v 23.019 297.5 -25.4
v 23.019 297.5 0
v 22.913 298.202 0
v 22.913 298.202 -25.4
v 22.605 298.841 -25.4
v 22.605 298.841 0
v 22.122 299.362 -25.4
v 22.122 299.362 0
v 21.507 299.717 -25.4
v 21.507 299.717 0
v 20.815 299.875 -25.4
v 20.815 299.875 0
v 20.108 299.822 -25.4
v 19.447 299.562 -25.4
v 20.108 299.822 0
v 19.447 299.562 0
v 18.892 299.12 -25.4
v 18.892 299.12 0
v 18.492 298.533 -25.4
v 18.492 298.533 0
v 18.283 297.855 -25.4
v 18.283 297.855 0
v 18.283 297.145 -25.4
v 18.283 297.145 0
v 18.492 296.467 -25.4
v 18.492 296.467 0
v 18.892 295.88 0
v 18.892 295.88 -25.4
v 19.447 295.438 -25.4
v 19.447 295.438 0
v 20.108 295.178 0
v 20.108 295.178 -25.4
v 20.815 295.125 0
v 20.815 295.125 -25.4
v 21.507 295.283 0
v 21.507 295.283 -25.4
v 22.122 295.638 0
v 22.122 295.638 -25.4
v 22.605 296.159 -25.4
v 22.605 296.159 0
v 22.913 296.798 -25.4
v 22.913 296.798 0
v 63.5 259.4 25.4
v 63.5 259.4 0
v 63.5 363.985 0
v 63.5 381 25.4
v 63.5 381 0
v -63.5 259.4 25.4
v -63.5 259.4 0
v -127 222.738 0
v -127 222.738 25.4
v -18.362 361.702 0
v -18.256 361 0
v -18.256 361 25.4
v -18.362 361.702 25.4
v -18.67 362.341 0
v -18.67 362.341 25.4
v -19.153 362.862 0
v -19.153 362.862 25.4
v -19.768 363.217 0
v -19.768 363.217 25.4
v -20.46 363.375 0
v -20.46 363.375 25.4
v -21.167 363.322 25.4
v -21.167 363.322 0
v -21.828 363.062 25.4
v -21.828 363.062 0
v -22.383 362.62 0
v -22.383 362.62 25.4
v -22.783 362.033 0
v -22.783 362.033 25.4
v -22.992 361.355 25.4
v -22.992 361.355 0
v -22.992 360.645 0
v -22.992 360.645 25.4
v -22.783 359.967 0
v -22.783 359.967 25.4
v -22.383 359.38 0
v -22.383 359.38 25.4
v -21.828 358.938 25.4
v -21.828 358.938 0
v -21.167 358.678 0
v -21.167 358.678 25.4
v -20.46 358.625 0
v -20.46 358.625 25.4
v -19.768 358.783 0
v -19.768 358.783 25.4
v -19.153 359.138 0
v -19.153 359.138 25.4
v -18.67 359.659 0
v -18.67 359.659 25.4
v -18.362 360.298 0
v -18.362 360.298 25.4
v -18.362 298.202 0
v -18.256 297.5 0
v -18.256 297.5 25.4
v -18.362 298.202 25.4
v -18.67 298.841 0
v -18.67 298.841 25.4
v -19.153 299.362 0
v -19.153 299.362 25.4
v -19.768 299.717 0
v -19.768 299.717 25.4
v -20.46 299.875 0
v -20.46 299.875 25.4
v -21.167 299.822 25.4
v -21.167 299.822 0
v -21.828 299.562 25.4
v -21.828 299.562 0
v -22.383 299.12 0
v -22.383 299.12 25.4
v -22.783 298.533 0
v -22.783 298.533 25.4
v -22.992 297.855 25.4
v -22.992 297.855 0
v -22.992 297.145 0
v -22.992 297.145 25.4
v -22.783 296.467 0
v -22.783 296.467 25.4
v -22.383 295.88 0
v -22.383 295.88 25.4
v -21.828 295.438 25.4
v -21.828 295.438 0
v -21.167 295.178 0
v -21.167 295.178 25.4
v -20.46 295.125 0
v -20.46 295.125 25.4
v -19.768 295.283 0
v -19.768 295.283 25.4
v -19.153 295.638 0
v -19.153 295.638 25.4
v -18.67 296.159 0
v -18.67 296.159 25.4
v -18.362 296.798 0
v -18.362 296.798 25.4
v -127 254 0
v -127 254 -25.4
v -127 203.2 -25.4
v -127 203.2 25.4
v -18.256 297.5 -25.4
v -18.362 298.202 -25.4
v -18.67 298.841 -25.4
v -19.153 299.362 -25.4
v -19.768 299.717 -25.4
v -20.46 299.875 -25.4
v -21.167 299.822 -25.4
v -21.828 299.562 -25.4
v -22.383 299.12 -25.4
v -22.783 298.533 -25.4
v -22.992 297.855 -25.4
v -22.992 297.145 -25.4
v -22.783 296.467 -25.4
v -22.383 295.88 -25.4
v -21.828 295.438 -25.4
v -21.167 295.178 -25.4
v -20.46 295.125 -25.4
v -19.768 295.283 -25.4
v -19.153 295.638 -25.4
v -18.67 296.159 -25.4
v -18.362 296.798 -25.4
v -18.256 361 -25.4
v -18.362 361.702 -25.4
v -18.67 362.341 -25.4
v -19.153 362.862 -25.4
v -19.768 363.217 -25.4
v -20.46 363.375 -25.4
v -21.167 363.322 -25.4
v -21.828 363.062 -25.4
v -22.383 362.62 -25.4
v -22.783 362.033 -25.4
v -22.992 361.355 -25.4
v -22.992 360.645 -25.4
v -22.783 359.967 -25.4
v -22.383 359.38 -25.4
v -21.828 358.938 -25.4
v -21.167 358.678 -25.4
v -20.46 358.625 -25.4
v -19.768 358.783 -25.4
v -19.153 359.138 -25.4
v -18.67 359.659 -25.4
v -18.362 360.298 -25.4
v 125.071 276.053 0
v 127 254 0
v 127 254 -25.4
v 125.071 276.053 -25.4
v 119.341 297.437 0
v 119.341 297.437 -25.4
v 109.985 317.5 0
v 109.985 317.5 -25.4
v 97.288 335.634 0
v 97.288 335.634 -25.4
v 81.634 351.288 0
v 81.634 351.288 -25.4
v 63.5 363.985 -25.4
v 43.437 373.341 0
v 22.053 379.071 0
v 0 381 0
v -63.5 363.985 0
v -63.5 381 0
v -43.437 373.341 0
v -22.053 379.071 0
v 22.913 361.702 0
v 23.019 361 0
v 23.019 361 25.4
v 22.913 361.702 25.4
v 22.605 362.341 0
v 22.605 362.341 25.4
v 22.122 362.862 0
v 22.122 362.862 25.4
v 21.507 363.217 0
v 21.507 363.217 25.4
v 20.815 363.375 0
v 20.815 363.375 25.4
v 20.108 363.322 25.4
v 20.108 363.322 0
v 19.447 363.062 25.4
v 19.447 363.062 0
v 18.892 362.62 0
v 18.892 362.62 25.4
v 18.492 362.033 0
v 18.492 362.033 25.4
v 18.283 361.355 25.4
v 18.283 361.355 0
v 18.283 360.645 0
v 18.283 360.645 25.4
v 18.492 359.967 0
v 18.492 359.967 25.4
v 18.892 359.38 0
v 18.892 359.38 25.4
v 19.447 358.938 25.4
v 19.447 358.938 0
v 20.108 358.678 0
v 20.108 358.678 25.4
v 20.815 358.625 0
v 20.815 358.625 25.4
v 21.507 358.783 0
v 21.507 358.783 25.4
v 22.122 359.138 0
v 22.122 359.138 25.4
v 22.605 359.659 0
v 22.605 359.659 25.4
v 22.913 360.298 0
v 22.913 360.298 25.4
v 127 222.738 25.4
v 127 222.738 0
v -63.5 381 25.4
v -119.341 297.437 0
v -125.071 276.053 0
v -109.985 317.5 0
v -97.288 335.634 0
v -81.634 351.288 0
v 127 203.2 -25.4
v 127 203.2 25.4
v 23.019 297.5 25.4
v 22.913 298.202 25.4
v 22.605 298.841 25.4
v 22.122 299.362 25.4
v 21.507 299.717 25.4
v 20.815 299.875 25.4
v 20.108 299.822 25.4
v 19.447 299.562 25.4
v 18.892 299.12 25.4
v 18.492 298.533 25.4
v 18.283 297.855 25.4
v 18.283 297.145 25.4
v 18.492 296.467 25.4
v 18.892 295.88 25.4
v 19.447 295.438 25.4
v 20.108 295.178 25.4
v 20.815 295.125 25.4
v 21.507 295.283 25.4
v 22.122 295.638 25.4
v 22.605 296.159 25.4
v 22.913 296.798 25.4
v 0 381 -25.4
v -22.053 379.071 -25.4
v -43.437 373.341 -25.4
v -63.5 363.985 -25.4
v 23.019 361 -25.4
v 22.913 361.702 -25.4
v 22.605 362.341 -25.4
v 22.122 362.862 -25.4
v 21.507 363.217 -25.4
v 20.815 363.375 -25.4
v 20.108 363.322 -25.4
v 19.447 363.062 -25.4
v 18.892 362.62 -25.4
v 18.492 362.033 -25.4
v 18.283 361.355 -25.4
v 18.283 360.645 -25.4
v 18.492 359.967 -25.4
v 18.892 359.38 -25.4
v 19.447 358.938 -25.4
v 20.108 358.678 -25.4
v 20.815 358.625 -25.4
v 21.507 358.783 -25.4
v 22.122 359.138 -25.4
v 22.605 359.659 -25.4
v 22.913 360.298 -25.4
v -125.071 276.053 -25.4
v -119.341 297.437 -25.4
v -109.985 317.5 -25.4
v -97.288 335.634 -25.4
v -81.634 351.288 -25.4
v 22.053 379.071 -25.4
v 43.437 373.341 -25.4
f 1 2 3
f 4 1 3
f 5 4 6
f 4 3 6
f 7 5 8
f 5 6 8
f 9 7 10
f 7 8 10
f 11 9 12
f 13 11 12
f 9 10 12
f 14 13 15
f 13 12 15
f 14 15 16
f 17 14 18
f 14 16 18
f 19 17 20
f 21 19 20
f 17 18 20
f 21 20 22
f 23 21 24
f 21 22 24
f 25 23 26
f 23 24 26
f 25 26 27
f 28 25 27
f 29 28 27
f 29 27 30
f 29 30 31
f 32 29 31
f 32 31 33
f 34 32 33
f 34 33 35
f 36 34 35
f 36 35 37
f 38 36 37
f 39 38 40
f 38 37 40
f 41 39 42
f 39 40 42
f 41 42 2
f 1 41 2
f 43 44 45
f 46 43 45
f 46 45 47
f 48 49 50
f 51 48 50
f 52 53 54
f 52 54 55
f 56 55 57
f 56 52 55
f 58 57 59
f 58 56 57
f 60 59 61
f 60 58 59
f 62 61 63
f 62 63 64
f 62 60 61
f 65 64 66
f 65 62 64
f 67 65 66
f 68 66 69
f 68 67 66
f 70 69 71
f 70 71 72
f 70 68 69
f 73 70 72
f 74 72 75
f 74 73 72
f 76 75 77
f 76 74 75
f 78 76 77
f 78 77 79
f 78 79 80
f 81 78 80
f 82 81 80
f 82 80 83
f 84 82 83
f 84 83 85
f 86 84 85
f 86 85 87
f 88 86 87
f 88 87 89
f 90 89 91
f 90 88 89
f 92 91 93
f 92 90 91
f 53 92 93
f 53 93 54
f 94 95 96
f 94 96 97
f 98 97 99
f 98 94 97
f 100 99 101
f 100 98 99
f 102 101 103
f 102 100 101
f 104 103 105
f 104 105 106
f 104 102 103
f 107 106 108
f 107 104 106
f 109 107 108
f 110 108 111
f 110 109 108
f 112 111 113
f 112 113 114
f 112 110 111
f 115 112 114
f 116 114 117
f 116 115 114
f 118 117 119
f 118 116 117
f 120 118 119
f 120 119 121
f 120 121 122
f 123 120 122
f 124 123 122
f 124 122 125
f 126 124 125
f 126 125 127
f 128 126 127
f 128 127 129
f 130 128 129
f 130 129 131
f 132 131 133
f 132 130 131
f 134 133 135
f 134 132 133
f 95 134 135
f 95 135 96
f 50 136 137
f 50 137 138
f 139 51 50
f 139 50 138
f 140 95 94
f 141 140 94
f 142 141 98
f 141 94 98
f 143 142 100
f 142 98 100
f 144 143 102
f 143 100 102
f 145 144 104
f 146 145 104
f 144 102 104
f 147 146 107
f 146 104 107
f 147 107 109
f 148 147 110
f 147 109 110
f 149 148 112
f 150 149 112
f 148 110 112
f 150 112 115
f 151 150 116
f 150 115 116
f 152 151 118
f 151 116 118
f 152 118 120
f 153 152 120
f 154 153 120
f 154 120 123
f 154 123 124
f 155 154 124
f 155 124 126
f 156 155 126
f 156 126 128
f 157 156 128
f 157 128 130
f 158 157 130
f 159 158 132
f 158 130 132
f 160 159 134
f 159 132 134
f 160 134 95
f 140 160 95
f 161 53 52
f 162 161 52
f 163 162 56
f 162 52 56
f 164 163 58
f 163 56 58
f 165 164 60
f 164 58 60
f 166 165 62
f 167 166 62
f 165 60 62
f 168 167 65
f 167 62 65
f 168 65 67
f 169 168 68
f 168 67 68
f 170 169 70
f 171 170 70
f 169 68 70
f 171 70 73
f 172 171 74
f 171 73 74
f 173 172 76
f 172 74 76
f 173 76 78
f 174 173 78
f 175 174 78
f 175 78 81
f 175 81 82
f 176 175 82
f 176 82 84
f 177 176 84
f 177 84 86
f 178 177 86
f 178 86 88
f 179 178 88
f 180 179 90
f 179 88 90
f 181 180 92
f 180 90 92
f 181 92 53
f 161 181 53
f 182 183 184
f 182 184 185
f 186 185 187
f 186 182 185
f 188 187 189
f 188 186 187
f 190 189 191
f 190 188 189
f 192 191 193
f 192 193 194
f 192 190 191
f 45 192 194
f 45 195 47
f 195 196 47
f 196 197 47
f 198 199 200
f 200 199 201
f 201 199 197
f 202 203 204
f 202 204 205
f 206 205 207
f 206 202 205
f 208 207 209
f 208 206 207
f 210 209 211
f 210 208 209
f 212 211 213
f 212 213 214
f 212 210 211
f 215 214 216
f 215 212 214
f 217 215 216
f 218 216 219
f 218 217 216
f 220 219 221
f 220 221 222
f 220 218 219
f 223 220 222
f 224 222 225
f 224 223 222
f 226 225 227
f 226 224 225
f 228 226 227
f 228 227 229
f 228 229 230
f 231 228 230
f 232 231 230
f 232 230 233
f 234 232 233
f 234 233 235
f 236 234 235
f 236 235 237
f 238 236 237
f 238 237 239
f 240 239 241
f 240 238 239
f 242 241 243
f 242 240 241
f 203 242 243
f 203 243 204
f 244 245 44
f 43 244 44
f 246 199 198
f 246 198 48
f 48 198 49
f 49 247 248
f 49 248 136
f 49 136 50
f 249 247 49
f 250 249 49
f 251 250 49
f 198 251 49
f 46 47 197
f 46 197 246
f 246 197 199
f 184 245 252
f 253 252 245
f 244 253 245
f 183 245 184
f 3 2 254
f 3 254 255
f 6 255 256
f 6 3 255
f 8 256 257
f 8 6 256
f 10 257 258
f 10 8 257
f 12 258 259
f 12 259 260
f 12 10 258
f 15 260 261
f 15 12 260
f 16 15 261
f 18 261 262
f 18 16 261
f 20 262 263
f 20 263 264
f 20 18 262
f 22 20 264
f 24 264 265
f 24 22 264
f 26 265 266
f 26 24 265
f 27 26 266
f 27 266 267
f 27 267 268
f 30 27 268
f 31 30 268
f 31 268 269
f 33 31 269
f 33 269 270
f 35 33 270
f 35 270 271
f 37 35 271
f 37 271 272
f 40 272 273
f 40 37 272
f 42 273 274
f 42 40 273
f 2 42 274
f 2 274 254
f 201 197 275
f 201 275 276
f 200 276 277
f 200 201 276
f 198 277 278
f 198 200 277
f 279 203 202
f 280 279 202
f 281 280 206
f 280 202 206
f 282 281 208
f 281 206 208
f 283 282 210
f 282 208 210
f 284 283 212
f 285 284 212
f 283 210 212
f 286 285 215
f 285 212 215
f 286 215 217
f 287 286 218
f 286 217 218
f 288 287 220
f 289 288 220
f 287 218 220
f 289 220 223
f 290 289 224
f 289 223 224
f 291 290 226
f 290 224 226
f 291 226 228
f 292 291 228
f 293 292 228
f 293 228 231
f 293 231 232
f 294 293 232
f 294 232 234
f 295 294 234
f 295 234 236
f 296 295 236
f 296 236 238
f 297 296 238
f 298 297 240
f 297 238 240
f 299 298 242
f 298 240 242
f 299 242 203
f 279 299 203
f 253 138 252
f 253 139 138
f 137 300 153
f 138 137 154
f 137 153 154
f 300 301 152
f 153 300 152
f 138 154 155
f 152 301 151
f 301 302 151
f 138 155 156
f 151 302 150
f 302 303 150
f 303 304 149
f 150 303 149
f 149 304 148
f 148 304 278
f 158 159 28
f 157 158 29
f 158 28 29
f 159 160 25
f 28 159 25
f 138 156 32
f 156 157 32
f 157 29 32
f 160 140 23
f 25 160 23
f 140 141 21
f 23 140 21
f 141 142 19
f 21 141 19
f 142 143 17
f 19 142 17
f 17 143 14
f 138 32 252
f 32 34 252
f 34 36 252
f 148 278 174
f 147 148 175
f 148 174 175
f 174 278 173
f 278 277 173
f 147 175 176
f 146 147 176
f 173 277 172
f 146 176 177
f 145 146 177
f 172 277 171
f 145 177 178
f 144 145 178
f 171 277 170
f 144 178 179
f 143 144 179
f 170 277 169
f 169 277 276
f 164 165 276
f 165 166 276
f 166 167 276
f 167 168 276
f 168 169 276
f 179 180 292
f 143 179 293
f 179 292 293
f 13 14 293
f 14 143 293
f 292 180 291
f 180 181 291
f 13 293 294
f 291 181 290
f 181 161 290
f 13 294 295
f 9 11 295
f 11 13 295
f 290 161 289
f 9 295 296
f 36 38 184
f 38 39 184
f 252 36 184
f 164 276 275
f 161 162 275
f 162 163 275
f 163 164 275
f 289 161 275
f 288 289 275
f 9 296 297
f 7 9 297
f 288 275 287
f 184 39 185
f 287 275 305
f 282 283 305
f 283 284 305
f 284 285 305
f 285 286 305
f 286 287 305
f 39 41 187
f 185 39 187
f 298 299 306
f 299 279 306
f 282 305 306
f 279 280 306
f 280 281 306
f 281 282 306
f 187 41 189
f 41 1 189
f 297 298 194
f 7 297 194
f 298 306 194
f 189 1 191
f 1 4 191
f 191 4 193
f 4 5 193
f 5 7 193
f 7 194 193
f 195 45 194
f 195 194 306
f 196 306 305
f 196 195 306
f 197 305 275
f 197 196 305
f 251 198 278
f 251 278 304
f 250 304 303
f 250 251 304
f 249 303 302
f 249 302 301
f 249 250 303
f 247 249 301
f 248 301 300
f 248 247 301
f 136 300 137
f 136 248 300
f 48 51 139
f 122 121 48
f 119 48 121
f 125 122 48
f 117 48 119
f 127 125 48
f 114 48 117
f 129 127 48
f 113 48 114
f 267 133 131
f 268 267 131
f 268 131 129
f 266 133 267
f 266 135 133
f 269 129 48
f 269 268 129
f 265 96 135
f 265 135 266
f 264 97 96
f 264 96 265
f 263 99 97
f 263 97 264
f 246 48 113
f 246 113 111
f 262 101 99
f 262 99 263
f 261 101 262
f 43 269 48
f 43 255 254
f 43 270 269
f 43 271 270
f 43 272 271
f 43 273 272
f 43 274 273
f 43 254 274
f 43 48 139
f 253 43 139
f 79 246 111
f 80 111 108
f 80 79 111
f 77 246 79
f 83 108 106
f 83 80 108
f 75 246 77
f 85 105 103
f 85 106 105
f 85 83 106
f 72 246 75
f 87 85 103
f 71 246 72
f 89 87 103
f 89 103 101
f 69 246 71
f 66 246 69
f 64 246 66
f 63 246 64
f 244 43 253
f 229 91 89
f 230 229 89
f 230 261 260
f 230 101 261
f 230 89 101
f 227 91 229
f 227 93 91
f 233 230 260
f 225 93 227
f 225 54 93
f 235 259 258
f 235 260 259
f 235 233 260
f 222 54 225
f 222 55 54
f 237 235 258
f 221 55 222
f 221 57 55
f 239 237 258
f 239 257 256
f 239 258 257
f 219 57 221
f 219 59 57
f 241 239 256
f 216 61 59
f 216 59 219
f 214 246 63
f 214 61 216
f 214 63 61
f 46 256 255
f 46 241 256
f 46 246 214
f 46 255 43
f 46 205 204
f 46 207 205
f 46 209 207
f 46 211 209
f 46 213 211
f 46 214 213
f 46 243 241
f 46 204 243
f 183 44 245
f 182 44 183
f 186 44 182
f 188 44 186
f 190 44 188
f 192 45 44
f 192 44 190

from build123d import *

# Parameters (mm, degrees)
F0_R     = 2.38125
F1_DEPTH = 25.4
F2_DEPTH = 25.4


with BuildPart() as f1:
    # F0 (on Top) → F1 (new body)
    with BuildSketch(Plane.XY):
        with BuildLine():
            ThreePointArc((0, 381), (-32.870019, 376.67258), (-63.5, 363.985226))
            Line((-63.5, 363.985226), (-63.5, 259.4))
            Line((-63.5, 259.4), (-127, 222.738258))
            Line((-127, 222.738258), (-127, 203.2))
            Line((-127, 203.2), (127, 203.2))
            Line((127, 203.2), (127, 222.738258))
            Line((127, 222.738258), (63.5, 259.4))
            Line((63.5, 259.4), (63.5, 363.985226))
            ThreePointArc((63.5, 363.985226), (32.870019, 376.67258), (0, 381))
        make_face()
        with Locations((-20.6375, 297.5)):
            Circle(F0_R, mode=Mode.SUBTRACT)
        with Locations((-20.6375, 361)):
            Circle(F0_R, mode=Mode.SUBTRACT)
        with Locations((20.6375, 297.5)):
            Circle(F0_R, mode=Mode.SUBTRACT)
        with Locations((20.6375, 361)):
            Circle(F0_R, mode=Mode.SUBTRACT)
        with BuildLine():
            Line((0, 381), (-63.5, 381))
            Line((-63.5, 381), (-63.5, 363.985226))
            ThreePointArc((-63.5, 363.985226), (-32.870019, 376.67258), (0, 381))
        make_face()
        with BuildLine():
            Line((63.5, 381), (0, 381))
            ThreePointArc((0, 381), (32.870019, 376.67258), (63.5, 363.985226))
            Line((63.5, 363.985226), (63.5, 381))
        make_face()
    extrude(amount=F1_DEPTH)

    # F0 (on Top) → F2 (join)
    with BuildSketch(Plane.XY):
        with BuildLine():
            ThreePointArc((127, 254), (109.985226, 317.5), (63.5, 363.985226))
            Line((63.5, 363.985226), (63.5, 259.4))
            Line((63.5, 259.4), (127, 222.738258))
            Line((127, 222.738258), (127, 254))
        make_face()
        with BuildLine():
            ThreePointArc((0, 381), (-32.870019, 376.67258), (-63.5, 363.985226))
            Line((-63.5, 363.985226), (-63.5, 259.4))
            Line((-63.5, 259.4), (-127, 222.738258))
            Line((-127, 222.738258), (-127, 203.2))
            Line((-127, 203.2), (127, 203.2))
            Line((127, 203.2), (127, 222.738258))
            Line((127, 222.738258), (63.5, 259.4))
            Line((63.5, 259.4), (63.5, 363.985226))
            ThreePointArc((63.5, 363.985226), (32.870019, 376.67258), (0, 381))
        make_face()
        with Locations((-20.6375, 297.5)):
            Circle(F0_R, mode=Mode.SUBTRACT)
        with Locations((-20.6375, 361)):
            Circle(F0_R, mode=Mode.SUBTRACT)
        with Locations((20.6375, 297.5)):
            Circle(F0_R, mode=Mode.SUBTRACT)
        with Locations((20.6375, 361)):
            Circle(F0_R, mode=Mode.SUBTRACT)
        with BuildLine():
            Line((-63.5, 259.4), (-63.5, 363.985226))
            ThreePointArc((-63.5, 363.985226), (-109.985226, 317.5), (-127, 254))
            Line((-127, 254), (-127, 222.738258))
            Line((-127, 222.738258), (-63.5, 259.4))
        make_face()
    extrude(amount=-F2_DEPTH)


solid = f1.part
